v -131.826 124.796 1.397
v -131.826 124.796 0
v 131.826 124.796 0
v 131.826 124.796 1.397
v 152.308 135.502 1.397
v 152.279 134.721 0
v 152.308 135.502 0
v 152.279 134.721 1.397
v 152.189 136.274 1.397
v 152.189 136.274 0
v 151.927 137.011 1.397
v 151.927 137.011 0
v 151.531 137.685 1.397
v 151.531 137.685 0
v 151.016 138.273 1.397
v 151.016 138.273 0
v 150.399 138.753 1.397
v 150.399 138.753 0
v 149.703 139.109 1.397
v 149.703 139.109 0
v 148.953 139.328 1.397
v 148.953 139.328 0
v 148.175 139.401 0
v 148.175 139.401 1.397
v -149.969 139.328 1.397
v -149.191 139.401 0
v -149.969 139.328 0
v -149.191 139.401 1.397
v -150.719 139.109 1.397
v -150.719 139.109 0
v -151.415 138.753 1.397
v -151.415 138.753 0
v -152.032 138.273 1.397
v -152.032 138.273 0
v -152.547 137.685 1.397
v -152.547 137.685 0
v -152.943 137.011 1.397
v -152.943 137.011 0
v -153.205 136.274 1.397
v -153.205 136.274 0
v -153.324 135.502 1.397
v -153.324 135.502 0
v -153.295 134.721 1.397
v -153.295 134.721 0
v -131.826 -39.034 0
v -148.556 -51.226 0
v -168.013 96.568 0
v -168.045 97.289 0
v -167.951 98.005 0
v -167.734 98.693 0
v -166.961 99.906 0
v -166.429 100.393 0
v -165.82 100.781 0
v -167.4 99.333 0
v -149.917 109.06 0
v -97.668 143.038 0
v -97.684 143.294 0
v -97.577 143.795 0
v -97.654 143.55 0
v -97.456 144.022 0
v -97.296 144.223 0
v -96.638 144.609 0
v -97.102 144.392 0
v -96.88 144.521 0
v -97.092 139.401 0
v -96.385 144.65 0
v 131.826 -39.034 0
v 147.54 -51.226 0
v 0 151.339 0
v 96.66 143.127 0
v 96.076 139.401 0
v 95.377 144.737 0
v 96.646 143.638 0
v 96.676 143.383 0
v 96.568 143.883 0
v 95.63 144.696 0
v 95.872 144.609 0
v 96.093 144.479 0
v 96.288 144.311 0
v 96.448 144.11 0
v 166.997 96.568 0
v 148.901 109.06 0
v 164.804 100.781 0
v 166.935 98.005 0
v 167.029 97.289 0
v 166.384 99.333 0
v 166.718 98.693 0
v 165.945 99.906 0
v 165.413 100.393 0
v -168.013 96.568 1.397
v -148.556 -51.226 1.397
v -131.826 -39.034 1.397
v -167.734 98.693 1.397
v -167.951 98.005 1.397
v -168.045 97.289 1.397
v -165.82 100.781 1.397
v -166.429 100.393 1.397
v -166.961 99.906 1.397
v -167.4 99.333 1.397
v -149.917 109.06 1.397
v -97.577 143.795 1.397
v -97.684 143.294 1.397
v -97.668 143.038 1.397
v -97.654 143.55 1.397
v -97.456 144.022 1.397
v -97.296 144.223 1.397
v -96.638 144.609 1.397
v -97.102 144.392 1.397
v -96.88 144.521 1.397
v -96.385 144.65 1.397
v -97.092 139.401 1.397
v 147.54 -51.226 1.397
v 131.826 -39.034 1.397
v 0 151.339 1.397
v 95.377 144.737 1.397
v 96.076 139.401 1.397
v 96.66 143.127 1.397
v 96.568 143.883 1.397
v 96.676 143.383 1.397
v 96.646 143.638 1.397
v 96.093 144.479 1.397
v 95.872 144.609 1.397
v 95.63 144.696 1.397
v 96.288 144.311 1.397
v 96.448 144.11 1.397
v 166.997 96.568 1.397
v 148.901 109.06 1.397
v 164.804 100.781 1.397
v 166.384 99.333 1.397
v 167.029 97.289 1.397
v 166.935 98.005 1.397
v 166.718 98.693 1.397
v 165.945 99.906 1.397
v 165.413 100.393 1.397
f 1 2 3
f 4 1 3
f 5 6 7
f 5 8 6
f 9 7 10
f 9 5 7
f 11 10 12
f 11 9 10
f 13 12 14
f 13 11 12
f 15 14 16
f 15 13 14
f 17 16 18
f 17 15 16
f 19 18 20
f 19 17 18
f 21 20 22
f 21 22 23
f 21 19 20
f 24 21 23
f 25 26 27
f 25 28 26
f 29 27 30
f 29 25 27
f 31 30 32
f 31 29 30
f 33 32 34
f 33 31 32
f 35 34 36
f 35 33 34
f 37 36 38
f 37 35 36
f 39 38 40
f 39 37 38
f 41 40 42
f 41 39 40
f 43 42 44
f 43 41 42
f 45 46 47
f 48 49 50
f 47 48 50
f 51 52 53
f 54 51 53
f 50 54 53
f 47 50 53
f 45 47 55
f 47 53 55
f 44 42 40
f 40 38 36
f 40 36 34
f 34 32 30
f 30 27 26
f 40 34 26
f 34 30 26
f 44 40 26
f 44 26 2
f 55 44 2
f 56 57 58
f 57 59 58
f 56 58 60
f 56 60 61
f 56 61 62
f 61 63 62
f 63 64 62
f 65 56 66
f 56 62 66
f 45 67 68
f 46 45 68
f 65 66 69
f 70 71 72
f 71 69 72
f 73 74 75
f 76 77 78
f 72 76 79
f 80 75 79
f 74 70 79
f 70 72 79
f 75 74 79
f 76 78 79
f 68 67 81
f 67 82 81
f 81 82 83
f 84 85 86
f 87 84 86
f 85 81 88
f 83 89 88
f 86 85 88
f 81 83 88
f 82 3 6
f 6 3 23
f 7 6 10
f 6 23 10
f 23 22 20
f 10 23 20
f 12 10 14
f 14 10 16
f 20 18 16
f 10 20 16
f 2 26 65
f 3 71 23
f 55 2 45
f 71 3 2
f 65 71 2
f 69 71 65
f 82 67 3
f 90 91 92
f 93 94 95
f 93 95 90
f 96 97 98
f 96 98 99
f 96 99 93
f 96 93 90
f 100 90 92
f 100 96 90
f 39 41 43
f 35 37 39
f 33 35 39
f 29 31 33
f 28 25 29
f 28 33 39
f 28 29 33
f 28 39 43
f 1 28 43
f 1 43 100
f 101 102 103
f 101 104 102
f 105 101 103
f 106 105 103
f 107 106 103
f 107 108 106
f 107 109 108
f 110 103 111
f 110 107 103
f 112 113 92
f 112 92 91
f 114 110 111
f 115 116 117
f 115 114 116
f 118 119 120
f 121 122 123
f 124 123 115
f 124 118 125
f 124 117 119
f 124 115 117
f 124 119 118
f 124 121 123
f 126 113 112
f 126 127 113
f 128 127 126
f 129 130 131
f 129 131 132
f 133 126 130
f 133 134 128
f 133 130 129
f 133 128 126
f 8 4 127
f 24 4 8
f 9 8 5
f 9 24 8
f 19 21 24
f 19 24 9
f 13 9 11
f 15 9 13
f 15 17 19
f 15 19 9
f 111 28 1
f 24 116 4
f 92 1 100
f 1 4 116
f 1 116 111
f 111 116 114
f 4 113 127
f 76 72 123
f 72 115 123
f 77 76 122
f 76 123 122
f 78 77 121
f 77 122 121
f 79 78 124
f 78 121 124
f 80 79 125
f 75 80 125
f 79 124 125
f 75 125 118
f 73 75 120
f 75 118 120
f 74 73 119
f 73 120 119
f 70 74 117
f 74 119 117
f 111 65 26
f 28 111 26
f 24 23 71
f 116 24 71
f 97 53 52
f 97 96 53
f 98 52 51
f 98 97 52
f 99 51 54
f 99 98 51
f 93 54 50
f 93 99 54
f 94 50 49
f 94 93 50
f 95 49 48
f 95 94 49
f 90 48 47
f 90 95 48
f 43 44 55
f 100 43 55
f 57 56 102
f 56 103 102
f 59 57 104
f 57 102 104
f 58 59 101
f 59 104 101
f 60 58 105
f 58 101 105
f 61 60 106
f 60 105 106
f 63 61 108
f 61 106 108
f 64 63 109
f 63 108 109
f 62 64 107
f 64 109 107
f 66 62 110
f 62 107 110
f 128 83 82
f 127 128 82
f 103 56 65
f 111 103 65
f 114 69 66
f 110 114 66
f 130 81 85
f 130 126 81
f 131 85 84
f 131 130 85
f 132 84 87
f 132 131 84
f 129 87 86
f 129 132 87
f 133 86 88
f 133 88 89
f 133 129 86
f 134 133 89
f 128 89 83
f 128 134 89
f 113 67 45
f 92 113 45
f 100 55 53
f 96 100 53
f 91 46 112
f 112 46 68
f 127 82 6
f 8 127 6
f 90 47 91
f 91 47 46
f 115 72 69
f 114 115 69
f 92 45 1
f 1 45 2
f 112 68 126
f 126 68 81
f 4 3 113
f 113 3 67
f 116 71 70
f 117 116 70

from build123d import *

# Parameters (mm, degrees)
F1_DEPTH = 1.397
F2_R     = 4.1402
F3_R     = 1.397


with BuildPart() as f1:
    # F0 (on Top) → F1 (new body)
    with BuildSketch(Plane.XY):
        Polygon((-97.091727, 139.401406), (-153.911527, 139.401406), (-149.916979, 109.059797), (-168.39164, 99.442497), (-148.55581, -51.225594), (0, -51.225594), (147.53981, -51.225594), (167.37564, 99.442497), (148.900979, 109.059797), (152.895527, 139.401406), (96.075727, 139.401406), (96.896243, 144.631802), (0, 151.339406), (-97.906282, 144.544299), align=None)
        Polygon((-131.826, -39.033594), (-131.826, 124.796406), (0, 124.796406), (130.81, 124.796406), (131.826, 124.796406), (131.826, -39.033594), (-1.016, -39.033594), align=None, mode=Mode.SUBTRACT)
    extrude(amount=F1_DEPTH)

    # F2
    f2_edges = [f1.edges().sort_by_distance(p)[0] for p in [
        (-153.911527, 139.401406, 0.6985),
        (152.895527, 139.401406, 0.6985),
        (-168.39164, 99.442497, 0.6985),
        (167.37564, 99.442497, 0.6985),
    ]]
    fillet(f2_edges, radius=F2_R)

    # F3
    f3_edges = [f1.edges().sort_by_distance(p)[0] for p in [
        (96.896243, 144.631802, 0.6985),
        (-97.906282, 144.544299, 0.6985),
    ]]
    fillet(f3_edges, radius=F3_R)


solid = f1.part
